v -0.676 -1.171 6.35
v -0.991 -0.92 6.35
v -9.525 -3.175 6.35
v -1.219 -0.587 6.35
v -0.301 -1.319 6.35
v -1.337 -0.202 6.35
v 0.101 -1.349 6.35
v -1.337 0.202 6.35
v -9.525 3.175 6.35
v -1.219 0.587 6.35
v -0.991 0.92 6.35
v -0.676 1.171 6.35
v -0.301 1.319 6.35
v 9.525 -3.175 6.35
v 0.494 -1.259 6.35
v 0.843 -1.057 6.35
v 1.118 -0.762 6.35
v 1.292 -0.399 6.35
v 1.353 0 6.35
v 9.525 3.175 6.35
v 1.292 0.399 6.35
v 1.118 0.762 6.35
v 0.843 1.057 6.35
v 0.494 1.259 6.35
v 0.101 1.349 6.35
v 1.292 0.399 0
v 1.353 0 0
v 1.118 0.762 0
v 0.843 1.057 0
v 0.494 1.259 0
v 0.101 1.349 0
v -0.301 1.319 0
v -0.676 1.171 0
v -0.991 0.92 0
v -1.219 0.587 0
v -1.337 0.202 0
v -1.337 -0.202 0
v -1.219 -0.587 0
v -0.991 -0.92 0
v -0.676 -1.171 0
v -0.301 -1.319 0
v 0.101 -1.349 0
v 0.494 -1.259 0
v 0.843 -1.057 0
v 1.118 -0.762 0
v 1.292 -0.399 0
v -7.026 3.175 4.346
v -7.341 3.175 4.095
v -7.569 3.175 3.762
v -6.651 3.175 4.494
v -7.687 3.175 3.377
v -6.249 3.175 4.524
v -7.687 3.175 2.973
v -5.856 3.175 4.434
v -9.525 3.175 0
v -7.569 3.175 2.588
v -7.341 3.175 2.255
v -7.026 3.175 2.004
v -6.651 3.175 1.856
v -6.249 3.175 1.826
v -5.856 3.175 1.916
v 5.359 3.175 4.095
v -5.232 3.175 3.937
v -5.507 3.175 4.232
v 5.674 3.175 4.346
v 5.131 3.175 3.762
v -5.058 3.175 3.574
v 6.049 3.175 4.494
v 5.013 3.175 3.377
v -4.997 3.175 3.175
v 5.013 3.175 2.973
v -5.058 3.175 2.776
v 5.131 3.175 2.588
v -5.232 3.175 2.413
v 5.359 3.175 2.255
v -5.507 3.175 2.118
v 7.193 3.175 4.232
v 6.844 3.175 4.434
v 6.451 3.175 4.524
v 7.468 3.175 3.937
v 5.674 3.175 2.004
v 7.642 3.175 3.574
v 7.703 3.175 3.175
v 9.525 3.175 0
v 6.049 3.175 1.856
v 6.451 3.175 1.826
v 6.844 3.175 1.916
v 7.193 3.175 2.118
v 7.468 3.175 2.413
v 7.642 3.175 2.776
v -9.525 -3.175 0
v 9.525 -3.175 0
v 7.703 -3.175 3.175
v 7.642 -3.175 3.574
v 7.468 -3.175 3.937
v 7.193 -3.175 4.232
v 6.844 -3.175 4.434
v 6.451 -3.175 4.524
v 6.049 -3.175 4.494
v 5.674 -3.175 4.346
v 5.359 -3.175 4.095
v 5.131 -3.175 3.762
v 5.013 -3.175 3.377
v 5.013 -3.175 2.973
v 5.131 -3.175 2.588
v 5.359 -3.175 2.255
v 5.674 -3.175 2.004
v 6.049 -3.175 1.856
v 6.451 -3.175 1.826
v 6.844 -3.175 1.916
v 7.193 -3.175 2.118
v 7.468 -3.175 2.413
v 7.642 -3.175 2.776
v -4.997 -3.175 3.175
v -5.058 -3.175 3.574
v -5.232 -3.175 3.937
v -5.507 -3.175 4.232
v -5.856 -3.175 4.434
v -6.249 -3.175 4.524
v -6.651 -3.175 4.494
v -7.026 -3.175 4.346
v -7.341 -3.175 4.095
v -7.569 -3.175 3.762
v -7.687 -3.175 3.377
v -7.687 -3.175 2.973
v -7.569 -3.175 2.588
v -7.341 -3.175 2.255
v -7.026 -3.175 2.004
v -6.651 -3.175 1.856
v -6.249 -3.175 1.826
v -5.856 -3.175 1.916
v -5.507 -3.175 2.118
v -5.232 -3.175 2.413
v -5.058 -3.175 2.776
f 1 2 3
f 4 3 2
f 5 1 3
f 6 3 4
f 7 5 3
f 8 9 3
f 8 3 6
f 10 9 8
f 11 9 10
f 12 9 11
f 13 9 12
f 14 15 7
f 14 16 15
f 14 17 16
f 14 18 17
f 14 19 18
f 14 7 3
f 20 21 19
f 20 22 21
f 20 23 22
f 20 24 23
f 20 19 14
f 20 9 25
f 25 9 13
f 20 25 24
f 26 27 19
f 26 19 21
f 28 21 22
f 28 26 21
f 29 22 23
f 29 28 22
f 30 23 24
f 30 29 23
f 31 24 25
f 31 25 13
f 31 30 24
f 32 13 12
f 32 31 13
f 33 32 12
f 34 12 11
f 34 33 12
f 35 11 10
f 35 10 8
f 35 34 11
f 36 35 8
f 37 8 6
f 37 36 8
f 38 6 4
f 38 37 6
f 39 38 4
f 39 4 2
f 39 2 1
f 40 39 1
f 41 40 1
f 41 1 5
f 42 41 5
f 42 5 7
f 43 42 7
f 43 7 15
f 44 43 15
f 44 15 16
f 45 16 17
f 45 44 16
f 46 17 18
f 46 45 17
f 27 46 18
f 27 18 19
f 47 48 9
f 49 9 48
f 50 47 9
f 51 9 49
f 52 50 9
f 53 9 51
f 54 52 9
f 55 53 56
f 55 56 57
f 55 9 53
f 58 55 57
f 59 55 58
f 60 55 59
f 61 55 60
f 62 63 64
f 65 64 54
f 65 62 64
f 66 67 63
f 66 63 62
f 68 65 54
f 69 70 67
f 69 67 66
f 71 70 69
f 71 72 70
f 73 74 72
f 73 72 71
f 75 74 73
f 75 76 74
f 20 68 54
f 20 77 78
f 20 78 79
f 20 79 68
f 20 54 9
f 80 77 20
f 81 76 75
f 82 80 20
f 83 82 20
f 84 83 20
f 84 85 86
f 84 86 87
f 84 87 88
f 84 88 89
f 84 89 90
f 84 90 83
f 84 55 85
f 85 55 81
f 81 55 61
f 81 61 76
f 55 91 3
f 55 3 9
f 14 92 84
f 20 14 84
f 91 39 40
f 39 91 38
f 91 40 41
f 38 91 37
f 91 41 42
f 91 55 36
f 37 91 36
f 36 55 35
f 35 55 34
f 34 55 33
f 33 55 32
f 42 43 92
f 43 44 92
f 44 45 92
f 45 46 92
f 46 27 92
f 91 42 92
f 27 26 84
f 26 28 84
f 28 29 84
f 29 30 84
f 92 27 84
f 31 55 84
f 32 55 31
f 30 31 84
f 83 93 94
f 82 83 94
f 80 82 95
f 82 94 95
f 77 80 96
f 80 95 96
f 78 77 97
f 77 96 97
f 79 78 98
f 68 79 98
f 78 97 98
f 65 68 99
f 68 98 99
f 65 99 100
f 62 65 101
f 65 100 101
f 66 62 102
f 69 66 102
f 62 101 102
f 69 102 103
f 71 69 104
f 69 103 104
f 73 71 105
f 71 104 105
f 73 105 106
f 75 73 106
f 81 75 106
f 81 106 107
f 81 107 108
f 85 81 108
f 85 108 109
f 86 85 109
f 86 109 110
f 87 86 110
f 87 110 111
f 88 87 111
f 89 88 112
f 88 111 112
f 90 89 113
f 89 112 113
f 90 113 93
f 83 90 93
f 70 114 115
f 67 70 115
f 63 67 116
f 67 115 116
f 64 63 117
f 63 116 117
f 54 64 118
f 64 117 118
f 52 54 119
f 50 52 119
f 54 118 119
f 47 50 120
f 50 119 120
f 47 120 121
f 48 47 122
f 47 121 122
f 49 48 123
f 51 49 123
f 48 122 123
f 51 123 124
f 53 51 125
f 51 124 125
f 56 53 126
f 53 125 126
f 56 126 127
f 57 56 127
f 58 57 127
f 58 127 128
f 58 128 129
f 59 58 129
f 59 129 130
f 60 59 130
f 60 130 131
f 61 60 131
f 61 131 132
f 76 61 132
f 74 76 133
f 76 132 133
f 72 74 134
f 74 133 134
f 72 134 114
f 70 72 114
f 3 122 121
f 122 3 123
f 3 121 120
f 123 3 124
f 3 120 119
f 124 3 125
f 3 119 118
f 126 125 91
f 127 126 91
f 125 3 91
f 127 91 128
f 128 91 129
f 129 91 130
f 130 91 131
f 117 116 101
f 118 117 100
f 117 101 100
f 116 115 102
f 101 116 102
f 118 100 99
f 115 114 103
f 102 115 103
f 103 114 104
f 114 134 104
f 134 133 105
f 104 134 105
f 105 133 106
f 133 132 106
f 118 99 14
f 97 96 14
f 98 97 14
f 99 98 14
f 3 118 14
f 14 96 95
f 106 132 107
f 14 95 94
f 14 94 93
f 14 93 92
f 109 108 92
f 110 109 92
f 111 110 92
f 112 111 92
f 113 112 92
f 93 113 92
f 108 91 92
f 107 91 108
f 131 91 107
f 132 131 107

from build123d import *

# Parameters (mm, degrees)
F0_W     = 19.05
F0_H     = 6.35
F0_R     = 1.35255
F1_DEPTH = 6.35
F2_R     = 1.35255
F3_DEPTH = 6.35


with BuildPart() as f1:
    # F0 (on Top) → F1 (new body)
    with BuildSketch(Plane.XY):
        Rectangle(F0_W, F0_H)
        Circle(F0_R, mode=Mode.SUBTRACT)
    extrude(amount=F1_DEPTH)

    # F2 (on face) → F3 (cut, through all)
    with BuildSketch(Plane.XZ.offset(3.175)):
        with Locations((-6.35, 3.175)):
            Circle(F2_R)
        with Locations((6.35, 3.175)):
            Circle(F2_R)
    extrude(amount=-F3_DEPTH, mode=Mode.SUBTRACT)


solid = f1.part
